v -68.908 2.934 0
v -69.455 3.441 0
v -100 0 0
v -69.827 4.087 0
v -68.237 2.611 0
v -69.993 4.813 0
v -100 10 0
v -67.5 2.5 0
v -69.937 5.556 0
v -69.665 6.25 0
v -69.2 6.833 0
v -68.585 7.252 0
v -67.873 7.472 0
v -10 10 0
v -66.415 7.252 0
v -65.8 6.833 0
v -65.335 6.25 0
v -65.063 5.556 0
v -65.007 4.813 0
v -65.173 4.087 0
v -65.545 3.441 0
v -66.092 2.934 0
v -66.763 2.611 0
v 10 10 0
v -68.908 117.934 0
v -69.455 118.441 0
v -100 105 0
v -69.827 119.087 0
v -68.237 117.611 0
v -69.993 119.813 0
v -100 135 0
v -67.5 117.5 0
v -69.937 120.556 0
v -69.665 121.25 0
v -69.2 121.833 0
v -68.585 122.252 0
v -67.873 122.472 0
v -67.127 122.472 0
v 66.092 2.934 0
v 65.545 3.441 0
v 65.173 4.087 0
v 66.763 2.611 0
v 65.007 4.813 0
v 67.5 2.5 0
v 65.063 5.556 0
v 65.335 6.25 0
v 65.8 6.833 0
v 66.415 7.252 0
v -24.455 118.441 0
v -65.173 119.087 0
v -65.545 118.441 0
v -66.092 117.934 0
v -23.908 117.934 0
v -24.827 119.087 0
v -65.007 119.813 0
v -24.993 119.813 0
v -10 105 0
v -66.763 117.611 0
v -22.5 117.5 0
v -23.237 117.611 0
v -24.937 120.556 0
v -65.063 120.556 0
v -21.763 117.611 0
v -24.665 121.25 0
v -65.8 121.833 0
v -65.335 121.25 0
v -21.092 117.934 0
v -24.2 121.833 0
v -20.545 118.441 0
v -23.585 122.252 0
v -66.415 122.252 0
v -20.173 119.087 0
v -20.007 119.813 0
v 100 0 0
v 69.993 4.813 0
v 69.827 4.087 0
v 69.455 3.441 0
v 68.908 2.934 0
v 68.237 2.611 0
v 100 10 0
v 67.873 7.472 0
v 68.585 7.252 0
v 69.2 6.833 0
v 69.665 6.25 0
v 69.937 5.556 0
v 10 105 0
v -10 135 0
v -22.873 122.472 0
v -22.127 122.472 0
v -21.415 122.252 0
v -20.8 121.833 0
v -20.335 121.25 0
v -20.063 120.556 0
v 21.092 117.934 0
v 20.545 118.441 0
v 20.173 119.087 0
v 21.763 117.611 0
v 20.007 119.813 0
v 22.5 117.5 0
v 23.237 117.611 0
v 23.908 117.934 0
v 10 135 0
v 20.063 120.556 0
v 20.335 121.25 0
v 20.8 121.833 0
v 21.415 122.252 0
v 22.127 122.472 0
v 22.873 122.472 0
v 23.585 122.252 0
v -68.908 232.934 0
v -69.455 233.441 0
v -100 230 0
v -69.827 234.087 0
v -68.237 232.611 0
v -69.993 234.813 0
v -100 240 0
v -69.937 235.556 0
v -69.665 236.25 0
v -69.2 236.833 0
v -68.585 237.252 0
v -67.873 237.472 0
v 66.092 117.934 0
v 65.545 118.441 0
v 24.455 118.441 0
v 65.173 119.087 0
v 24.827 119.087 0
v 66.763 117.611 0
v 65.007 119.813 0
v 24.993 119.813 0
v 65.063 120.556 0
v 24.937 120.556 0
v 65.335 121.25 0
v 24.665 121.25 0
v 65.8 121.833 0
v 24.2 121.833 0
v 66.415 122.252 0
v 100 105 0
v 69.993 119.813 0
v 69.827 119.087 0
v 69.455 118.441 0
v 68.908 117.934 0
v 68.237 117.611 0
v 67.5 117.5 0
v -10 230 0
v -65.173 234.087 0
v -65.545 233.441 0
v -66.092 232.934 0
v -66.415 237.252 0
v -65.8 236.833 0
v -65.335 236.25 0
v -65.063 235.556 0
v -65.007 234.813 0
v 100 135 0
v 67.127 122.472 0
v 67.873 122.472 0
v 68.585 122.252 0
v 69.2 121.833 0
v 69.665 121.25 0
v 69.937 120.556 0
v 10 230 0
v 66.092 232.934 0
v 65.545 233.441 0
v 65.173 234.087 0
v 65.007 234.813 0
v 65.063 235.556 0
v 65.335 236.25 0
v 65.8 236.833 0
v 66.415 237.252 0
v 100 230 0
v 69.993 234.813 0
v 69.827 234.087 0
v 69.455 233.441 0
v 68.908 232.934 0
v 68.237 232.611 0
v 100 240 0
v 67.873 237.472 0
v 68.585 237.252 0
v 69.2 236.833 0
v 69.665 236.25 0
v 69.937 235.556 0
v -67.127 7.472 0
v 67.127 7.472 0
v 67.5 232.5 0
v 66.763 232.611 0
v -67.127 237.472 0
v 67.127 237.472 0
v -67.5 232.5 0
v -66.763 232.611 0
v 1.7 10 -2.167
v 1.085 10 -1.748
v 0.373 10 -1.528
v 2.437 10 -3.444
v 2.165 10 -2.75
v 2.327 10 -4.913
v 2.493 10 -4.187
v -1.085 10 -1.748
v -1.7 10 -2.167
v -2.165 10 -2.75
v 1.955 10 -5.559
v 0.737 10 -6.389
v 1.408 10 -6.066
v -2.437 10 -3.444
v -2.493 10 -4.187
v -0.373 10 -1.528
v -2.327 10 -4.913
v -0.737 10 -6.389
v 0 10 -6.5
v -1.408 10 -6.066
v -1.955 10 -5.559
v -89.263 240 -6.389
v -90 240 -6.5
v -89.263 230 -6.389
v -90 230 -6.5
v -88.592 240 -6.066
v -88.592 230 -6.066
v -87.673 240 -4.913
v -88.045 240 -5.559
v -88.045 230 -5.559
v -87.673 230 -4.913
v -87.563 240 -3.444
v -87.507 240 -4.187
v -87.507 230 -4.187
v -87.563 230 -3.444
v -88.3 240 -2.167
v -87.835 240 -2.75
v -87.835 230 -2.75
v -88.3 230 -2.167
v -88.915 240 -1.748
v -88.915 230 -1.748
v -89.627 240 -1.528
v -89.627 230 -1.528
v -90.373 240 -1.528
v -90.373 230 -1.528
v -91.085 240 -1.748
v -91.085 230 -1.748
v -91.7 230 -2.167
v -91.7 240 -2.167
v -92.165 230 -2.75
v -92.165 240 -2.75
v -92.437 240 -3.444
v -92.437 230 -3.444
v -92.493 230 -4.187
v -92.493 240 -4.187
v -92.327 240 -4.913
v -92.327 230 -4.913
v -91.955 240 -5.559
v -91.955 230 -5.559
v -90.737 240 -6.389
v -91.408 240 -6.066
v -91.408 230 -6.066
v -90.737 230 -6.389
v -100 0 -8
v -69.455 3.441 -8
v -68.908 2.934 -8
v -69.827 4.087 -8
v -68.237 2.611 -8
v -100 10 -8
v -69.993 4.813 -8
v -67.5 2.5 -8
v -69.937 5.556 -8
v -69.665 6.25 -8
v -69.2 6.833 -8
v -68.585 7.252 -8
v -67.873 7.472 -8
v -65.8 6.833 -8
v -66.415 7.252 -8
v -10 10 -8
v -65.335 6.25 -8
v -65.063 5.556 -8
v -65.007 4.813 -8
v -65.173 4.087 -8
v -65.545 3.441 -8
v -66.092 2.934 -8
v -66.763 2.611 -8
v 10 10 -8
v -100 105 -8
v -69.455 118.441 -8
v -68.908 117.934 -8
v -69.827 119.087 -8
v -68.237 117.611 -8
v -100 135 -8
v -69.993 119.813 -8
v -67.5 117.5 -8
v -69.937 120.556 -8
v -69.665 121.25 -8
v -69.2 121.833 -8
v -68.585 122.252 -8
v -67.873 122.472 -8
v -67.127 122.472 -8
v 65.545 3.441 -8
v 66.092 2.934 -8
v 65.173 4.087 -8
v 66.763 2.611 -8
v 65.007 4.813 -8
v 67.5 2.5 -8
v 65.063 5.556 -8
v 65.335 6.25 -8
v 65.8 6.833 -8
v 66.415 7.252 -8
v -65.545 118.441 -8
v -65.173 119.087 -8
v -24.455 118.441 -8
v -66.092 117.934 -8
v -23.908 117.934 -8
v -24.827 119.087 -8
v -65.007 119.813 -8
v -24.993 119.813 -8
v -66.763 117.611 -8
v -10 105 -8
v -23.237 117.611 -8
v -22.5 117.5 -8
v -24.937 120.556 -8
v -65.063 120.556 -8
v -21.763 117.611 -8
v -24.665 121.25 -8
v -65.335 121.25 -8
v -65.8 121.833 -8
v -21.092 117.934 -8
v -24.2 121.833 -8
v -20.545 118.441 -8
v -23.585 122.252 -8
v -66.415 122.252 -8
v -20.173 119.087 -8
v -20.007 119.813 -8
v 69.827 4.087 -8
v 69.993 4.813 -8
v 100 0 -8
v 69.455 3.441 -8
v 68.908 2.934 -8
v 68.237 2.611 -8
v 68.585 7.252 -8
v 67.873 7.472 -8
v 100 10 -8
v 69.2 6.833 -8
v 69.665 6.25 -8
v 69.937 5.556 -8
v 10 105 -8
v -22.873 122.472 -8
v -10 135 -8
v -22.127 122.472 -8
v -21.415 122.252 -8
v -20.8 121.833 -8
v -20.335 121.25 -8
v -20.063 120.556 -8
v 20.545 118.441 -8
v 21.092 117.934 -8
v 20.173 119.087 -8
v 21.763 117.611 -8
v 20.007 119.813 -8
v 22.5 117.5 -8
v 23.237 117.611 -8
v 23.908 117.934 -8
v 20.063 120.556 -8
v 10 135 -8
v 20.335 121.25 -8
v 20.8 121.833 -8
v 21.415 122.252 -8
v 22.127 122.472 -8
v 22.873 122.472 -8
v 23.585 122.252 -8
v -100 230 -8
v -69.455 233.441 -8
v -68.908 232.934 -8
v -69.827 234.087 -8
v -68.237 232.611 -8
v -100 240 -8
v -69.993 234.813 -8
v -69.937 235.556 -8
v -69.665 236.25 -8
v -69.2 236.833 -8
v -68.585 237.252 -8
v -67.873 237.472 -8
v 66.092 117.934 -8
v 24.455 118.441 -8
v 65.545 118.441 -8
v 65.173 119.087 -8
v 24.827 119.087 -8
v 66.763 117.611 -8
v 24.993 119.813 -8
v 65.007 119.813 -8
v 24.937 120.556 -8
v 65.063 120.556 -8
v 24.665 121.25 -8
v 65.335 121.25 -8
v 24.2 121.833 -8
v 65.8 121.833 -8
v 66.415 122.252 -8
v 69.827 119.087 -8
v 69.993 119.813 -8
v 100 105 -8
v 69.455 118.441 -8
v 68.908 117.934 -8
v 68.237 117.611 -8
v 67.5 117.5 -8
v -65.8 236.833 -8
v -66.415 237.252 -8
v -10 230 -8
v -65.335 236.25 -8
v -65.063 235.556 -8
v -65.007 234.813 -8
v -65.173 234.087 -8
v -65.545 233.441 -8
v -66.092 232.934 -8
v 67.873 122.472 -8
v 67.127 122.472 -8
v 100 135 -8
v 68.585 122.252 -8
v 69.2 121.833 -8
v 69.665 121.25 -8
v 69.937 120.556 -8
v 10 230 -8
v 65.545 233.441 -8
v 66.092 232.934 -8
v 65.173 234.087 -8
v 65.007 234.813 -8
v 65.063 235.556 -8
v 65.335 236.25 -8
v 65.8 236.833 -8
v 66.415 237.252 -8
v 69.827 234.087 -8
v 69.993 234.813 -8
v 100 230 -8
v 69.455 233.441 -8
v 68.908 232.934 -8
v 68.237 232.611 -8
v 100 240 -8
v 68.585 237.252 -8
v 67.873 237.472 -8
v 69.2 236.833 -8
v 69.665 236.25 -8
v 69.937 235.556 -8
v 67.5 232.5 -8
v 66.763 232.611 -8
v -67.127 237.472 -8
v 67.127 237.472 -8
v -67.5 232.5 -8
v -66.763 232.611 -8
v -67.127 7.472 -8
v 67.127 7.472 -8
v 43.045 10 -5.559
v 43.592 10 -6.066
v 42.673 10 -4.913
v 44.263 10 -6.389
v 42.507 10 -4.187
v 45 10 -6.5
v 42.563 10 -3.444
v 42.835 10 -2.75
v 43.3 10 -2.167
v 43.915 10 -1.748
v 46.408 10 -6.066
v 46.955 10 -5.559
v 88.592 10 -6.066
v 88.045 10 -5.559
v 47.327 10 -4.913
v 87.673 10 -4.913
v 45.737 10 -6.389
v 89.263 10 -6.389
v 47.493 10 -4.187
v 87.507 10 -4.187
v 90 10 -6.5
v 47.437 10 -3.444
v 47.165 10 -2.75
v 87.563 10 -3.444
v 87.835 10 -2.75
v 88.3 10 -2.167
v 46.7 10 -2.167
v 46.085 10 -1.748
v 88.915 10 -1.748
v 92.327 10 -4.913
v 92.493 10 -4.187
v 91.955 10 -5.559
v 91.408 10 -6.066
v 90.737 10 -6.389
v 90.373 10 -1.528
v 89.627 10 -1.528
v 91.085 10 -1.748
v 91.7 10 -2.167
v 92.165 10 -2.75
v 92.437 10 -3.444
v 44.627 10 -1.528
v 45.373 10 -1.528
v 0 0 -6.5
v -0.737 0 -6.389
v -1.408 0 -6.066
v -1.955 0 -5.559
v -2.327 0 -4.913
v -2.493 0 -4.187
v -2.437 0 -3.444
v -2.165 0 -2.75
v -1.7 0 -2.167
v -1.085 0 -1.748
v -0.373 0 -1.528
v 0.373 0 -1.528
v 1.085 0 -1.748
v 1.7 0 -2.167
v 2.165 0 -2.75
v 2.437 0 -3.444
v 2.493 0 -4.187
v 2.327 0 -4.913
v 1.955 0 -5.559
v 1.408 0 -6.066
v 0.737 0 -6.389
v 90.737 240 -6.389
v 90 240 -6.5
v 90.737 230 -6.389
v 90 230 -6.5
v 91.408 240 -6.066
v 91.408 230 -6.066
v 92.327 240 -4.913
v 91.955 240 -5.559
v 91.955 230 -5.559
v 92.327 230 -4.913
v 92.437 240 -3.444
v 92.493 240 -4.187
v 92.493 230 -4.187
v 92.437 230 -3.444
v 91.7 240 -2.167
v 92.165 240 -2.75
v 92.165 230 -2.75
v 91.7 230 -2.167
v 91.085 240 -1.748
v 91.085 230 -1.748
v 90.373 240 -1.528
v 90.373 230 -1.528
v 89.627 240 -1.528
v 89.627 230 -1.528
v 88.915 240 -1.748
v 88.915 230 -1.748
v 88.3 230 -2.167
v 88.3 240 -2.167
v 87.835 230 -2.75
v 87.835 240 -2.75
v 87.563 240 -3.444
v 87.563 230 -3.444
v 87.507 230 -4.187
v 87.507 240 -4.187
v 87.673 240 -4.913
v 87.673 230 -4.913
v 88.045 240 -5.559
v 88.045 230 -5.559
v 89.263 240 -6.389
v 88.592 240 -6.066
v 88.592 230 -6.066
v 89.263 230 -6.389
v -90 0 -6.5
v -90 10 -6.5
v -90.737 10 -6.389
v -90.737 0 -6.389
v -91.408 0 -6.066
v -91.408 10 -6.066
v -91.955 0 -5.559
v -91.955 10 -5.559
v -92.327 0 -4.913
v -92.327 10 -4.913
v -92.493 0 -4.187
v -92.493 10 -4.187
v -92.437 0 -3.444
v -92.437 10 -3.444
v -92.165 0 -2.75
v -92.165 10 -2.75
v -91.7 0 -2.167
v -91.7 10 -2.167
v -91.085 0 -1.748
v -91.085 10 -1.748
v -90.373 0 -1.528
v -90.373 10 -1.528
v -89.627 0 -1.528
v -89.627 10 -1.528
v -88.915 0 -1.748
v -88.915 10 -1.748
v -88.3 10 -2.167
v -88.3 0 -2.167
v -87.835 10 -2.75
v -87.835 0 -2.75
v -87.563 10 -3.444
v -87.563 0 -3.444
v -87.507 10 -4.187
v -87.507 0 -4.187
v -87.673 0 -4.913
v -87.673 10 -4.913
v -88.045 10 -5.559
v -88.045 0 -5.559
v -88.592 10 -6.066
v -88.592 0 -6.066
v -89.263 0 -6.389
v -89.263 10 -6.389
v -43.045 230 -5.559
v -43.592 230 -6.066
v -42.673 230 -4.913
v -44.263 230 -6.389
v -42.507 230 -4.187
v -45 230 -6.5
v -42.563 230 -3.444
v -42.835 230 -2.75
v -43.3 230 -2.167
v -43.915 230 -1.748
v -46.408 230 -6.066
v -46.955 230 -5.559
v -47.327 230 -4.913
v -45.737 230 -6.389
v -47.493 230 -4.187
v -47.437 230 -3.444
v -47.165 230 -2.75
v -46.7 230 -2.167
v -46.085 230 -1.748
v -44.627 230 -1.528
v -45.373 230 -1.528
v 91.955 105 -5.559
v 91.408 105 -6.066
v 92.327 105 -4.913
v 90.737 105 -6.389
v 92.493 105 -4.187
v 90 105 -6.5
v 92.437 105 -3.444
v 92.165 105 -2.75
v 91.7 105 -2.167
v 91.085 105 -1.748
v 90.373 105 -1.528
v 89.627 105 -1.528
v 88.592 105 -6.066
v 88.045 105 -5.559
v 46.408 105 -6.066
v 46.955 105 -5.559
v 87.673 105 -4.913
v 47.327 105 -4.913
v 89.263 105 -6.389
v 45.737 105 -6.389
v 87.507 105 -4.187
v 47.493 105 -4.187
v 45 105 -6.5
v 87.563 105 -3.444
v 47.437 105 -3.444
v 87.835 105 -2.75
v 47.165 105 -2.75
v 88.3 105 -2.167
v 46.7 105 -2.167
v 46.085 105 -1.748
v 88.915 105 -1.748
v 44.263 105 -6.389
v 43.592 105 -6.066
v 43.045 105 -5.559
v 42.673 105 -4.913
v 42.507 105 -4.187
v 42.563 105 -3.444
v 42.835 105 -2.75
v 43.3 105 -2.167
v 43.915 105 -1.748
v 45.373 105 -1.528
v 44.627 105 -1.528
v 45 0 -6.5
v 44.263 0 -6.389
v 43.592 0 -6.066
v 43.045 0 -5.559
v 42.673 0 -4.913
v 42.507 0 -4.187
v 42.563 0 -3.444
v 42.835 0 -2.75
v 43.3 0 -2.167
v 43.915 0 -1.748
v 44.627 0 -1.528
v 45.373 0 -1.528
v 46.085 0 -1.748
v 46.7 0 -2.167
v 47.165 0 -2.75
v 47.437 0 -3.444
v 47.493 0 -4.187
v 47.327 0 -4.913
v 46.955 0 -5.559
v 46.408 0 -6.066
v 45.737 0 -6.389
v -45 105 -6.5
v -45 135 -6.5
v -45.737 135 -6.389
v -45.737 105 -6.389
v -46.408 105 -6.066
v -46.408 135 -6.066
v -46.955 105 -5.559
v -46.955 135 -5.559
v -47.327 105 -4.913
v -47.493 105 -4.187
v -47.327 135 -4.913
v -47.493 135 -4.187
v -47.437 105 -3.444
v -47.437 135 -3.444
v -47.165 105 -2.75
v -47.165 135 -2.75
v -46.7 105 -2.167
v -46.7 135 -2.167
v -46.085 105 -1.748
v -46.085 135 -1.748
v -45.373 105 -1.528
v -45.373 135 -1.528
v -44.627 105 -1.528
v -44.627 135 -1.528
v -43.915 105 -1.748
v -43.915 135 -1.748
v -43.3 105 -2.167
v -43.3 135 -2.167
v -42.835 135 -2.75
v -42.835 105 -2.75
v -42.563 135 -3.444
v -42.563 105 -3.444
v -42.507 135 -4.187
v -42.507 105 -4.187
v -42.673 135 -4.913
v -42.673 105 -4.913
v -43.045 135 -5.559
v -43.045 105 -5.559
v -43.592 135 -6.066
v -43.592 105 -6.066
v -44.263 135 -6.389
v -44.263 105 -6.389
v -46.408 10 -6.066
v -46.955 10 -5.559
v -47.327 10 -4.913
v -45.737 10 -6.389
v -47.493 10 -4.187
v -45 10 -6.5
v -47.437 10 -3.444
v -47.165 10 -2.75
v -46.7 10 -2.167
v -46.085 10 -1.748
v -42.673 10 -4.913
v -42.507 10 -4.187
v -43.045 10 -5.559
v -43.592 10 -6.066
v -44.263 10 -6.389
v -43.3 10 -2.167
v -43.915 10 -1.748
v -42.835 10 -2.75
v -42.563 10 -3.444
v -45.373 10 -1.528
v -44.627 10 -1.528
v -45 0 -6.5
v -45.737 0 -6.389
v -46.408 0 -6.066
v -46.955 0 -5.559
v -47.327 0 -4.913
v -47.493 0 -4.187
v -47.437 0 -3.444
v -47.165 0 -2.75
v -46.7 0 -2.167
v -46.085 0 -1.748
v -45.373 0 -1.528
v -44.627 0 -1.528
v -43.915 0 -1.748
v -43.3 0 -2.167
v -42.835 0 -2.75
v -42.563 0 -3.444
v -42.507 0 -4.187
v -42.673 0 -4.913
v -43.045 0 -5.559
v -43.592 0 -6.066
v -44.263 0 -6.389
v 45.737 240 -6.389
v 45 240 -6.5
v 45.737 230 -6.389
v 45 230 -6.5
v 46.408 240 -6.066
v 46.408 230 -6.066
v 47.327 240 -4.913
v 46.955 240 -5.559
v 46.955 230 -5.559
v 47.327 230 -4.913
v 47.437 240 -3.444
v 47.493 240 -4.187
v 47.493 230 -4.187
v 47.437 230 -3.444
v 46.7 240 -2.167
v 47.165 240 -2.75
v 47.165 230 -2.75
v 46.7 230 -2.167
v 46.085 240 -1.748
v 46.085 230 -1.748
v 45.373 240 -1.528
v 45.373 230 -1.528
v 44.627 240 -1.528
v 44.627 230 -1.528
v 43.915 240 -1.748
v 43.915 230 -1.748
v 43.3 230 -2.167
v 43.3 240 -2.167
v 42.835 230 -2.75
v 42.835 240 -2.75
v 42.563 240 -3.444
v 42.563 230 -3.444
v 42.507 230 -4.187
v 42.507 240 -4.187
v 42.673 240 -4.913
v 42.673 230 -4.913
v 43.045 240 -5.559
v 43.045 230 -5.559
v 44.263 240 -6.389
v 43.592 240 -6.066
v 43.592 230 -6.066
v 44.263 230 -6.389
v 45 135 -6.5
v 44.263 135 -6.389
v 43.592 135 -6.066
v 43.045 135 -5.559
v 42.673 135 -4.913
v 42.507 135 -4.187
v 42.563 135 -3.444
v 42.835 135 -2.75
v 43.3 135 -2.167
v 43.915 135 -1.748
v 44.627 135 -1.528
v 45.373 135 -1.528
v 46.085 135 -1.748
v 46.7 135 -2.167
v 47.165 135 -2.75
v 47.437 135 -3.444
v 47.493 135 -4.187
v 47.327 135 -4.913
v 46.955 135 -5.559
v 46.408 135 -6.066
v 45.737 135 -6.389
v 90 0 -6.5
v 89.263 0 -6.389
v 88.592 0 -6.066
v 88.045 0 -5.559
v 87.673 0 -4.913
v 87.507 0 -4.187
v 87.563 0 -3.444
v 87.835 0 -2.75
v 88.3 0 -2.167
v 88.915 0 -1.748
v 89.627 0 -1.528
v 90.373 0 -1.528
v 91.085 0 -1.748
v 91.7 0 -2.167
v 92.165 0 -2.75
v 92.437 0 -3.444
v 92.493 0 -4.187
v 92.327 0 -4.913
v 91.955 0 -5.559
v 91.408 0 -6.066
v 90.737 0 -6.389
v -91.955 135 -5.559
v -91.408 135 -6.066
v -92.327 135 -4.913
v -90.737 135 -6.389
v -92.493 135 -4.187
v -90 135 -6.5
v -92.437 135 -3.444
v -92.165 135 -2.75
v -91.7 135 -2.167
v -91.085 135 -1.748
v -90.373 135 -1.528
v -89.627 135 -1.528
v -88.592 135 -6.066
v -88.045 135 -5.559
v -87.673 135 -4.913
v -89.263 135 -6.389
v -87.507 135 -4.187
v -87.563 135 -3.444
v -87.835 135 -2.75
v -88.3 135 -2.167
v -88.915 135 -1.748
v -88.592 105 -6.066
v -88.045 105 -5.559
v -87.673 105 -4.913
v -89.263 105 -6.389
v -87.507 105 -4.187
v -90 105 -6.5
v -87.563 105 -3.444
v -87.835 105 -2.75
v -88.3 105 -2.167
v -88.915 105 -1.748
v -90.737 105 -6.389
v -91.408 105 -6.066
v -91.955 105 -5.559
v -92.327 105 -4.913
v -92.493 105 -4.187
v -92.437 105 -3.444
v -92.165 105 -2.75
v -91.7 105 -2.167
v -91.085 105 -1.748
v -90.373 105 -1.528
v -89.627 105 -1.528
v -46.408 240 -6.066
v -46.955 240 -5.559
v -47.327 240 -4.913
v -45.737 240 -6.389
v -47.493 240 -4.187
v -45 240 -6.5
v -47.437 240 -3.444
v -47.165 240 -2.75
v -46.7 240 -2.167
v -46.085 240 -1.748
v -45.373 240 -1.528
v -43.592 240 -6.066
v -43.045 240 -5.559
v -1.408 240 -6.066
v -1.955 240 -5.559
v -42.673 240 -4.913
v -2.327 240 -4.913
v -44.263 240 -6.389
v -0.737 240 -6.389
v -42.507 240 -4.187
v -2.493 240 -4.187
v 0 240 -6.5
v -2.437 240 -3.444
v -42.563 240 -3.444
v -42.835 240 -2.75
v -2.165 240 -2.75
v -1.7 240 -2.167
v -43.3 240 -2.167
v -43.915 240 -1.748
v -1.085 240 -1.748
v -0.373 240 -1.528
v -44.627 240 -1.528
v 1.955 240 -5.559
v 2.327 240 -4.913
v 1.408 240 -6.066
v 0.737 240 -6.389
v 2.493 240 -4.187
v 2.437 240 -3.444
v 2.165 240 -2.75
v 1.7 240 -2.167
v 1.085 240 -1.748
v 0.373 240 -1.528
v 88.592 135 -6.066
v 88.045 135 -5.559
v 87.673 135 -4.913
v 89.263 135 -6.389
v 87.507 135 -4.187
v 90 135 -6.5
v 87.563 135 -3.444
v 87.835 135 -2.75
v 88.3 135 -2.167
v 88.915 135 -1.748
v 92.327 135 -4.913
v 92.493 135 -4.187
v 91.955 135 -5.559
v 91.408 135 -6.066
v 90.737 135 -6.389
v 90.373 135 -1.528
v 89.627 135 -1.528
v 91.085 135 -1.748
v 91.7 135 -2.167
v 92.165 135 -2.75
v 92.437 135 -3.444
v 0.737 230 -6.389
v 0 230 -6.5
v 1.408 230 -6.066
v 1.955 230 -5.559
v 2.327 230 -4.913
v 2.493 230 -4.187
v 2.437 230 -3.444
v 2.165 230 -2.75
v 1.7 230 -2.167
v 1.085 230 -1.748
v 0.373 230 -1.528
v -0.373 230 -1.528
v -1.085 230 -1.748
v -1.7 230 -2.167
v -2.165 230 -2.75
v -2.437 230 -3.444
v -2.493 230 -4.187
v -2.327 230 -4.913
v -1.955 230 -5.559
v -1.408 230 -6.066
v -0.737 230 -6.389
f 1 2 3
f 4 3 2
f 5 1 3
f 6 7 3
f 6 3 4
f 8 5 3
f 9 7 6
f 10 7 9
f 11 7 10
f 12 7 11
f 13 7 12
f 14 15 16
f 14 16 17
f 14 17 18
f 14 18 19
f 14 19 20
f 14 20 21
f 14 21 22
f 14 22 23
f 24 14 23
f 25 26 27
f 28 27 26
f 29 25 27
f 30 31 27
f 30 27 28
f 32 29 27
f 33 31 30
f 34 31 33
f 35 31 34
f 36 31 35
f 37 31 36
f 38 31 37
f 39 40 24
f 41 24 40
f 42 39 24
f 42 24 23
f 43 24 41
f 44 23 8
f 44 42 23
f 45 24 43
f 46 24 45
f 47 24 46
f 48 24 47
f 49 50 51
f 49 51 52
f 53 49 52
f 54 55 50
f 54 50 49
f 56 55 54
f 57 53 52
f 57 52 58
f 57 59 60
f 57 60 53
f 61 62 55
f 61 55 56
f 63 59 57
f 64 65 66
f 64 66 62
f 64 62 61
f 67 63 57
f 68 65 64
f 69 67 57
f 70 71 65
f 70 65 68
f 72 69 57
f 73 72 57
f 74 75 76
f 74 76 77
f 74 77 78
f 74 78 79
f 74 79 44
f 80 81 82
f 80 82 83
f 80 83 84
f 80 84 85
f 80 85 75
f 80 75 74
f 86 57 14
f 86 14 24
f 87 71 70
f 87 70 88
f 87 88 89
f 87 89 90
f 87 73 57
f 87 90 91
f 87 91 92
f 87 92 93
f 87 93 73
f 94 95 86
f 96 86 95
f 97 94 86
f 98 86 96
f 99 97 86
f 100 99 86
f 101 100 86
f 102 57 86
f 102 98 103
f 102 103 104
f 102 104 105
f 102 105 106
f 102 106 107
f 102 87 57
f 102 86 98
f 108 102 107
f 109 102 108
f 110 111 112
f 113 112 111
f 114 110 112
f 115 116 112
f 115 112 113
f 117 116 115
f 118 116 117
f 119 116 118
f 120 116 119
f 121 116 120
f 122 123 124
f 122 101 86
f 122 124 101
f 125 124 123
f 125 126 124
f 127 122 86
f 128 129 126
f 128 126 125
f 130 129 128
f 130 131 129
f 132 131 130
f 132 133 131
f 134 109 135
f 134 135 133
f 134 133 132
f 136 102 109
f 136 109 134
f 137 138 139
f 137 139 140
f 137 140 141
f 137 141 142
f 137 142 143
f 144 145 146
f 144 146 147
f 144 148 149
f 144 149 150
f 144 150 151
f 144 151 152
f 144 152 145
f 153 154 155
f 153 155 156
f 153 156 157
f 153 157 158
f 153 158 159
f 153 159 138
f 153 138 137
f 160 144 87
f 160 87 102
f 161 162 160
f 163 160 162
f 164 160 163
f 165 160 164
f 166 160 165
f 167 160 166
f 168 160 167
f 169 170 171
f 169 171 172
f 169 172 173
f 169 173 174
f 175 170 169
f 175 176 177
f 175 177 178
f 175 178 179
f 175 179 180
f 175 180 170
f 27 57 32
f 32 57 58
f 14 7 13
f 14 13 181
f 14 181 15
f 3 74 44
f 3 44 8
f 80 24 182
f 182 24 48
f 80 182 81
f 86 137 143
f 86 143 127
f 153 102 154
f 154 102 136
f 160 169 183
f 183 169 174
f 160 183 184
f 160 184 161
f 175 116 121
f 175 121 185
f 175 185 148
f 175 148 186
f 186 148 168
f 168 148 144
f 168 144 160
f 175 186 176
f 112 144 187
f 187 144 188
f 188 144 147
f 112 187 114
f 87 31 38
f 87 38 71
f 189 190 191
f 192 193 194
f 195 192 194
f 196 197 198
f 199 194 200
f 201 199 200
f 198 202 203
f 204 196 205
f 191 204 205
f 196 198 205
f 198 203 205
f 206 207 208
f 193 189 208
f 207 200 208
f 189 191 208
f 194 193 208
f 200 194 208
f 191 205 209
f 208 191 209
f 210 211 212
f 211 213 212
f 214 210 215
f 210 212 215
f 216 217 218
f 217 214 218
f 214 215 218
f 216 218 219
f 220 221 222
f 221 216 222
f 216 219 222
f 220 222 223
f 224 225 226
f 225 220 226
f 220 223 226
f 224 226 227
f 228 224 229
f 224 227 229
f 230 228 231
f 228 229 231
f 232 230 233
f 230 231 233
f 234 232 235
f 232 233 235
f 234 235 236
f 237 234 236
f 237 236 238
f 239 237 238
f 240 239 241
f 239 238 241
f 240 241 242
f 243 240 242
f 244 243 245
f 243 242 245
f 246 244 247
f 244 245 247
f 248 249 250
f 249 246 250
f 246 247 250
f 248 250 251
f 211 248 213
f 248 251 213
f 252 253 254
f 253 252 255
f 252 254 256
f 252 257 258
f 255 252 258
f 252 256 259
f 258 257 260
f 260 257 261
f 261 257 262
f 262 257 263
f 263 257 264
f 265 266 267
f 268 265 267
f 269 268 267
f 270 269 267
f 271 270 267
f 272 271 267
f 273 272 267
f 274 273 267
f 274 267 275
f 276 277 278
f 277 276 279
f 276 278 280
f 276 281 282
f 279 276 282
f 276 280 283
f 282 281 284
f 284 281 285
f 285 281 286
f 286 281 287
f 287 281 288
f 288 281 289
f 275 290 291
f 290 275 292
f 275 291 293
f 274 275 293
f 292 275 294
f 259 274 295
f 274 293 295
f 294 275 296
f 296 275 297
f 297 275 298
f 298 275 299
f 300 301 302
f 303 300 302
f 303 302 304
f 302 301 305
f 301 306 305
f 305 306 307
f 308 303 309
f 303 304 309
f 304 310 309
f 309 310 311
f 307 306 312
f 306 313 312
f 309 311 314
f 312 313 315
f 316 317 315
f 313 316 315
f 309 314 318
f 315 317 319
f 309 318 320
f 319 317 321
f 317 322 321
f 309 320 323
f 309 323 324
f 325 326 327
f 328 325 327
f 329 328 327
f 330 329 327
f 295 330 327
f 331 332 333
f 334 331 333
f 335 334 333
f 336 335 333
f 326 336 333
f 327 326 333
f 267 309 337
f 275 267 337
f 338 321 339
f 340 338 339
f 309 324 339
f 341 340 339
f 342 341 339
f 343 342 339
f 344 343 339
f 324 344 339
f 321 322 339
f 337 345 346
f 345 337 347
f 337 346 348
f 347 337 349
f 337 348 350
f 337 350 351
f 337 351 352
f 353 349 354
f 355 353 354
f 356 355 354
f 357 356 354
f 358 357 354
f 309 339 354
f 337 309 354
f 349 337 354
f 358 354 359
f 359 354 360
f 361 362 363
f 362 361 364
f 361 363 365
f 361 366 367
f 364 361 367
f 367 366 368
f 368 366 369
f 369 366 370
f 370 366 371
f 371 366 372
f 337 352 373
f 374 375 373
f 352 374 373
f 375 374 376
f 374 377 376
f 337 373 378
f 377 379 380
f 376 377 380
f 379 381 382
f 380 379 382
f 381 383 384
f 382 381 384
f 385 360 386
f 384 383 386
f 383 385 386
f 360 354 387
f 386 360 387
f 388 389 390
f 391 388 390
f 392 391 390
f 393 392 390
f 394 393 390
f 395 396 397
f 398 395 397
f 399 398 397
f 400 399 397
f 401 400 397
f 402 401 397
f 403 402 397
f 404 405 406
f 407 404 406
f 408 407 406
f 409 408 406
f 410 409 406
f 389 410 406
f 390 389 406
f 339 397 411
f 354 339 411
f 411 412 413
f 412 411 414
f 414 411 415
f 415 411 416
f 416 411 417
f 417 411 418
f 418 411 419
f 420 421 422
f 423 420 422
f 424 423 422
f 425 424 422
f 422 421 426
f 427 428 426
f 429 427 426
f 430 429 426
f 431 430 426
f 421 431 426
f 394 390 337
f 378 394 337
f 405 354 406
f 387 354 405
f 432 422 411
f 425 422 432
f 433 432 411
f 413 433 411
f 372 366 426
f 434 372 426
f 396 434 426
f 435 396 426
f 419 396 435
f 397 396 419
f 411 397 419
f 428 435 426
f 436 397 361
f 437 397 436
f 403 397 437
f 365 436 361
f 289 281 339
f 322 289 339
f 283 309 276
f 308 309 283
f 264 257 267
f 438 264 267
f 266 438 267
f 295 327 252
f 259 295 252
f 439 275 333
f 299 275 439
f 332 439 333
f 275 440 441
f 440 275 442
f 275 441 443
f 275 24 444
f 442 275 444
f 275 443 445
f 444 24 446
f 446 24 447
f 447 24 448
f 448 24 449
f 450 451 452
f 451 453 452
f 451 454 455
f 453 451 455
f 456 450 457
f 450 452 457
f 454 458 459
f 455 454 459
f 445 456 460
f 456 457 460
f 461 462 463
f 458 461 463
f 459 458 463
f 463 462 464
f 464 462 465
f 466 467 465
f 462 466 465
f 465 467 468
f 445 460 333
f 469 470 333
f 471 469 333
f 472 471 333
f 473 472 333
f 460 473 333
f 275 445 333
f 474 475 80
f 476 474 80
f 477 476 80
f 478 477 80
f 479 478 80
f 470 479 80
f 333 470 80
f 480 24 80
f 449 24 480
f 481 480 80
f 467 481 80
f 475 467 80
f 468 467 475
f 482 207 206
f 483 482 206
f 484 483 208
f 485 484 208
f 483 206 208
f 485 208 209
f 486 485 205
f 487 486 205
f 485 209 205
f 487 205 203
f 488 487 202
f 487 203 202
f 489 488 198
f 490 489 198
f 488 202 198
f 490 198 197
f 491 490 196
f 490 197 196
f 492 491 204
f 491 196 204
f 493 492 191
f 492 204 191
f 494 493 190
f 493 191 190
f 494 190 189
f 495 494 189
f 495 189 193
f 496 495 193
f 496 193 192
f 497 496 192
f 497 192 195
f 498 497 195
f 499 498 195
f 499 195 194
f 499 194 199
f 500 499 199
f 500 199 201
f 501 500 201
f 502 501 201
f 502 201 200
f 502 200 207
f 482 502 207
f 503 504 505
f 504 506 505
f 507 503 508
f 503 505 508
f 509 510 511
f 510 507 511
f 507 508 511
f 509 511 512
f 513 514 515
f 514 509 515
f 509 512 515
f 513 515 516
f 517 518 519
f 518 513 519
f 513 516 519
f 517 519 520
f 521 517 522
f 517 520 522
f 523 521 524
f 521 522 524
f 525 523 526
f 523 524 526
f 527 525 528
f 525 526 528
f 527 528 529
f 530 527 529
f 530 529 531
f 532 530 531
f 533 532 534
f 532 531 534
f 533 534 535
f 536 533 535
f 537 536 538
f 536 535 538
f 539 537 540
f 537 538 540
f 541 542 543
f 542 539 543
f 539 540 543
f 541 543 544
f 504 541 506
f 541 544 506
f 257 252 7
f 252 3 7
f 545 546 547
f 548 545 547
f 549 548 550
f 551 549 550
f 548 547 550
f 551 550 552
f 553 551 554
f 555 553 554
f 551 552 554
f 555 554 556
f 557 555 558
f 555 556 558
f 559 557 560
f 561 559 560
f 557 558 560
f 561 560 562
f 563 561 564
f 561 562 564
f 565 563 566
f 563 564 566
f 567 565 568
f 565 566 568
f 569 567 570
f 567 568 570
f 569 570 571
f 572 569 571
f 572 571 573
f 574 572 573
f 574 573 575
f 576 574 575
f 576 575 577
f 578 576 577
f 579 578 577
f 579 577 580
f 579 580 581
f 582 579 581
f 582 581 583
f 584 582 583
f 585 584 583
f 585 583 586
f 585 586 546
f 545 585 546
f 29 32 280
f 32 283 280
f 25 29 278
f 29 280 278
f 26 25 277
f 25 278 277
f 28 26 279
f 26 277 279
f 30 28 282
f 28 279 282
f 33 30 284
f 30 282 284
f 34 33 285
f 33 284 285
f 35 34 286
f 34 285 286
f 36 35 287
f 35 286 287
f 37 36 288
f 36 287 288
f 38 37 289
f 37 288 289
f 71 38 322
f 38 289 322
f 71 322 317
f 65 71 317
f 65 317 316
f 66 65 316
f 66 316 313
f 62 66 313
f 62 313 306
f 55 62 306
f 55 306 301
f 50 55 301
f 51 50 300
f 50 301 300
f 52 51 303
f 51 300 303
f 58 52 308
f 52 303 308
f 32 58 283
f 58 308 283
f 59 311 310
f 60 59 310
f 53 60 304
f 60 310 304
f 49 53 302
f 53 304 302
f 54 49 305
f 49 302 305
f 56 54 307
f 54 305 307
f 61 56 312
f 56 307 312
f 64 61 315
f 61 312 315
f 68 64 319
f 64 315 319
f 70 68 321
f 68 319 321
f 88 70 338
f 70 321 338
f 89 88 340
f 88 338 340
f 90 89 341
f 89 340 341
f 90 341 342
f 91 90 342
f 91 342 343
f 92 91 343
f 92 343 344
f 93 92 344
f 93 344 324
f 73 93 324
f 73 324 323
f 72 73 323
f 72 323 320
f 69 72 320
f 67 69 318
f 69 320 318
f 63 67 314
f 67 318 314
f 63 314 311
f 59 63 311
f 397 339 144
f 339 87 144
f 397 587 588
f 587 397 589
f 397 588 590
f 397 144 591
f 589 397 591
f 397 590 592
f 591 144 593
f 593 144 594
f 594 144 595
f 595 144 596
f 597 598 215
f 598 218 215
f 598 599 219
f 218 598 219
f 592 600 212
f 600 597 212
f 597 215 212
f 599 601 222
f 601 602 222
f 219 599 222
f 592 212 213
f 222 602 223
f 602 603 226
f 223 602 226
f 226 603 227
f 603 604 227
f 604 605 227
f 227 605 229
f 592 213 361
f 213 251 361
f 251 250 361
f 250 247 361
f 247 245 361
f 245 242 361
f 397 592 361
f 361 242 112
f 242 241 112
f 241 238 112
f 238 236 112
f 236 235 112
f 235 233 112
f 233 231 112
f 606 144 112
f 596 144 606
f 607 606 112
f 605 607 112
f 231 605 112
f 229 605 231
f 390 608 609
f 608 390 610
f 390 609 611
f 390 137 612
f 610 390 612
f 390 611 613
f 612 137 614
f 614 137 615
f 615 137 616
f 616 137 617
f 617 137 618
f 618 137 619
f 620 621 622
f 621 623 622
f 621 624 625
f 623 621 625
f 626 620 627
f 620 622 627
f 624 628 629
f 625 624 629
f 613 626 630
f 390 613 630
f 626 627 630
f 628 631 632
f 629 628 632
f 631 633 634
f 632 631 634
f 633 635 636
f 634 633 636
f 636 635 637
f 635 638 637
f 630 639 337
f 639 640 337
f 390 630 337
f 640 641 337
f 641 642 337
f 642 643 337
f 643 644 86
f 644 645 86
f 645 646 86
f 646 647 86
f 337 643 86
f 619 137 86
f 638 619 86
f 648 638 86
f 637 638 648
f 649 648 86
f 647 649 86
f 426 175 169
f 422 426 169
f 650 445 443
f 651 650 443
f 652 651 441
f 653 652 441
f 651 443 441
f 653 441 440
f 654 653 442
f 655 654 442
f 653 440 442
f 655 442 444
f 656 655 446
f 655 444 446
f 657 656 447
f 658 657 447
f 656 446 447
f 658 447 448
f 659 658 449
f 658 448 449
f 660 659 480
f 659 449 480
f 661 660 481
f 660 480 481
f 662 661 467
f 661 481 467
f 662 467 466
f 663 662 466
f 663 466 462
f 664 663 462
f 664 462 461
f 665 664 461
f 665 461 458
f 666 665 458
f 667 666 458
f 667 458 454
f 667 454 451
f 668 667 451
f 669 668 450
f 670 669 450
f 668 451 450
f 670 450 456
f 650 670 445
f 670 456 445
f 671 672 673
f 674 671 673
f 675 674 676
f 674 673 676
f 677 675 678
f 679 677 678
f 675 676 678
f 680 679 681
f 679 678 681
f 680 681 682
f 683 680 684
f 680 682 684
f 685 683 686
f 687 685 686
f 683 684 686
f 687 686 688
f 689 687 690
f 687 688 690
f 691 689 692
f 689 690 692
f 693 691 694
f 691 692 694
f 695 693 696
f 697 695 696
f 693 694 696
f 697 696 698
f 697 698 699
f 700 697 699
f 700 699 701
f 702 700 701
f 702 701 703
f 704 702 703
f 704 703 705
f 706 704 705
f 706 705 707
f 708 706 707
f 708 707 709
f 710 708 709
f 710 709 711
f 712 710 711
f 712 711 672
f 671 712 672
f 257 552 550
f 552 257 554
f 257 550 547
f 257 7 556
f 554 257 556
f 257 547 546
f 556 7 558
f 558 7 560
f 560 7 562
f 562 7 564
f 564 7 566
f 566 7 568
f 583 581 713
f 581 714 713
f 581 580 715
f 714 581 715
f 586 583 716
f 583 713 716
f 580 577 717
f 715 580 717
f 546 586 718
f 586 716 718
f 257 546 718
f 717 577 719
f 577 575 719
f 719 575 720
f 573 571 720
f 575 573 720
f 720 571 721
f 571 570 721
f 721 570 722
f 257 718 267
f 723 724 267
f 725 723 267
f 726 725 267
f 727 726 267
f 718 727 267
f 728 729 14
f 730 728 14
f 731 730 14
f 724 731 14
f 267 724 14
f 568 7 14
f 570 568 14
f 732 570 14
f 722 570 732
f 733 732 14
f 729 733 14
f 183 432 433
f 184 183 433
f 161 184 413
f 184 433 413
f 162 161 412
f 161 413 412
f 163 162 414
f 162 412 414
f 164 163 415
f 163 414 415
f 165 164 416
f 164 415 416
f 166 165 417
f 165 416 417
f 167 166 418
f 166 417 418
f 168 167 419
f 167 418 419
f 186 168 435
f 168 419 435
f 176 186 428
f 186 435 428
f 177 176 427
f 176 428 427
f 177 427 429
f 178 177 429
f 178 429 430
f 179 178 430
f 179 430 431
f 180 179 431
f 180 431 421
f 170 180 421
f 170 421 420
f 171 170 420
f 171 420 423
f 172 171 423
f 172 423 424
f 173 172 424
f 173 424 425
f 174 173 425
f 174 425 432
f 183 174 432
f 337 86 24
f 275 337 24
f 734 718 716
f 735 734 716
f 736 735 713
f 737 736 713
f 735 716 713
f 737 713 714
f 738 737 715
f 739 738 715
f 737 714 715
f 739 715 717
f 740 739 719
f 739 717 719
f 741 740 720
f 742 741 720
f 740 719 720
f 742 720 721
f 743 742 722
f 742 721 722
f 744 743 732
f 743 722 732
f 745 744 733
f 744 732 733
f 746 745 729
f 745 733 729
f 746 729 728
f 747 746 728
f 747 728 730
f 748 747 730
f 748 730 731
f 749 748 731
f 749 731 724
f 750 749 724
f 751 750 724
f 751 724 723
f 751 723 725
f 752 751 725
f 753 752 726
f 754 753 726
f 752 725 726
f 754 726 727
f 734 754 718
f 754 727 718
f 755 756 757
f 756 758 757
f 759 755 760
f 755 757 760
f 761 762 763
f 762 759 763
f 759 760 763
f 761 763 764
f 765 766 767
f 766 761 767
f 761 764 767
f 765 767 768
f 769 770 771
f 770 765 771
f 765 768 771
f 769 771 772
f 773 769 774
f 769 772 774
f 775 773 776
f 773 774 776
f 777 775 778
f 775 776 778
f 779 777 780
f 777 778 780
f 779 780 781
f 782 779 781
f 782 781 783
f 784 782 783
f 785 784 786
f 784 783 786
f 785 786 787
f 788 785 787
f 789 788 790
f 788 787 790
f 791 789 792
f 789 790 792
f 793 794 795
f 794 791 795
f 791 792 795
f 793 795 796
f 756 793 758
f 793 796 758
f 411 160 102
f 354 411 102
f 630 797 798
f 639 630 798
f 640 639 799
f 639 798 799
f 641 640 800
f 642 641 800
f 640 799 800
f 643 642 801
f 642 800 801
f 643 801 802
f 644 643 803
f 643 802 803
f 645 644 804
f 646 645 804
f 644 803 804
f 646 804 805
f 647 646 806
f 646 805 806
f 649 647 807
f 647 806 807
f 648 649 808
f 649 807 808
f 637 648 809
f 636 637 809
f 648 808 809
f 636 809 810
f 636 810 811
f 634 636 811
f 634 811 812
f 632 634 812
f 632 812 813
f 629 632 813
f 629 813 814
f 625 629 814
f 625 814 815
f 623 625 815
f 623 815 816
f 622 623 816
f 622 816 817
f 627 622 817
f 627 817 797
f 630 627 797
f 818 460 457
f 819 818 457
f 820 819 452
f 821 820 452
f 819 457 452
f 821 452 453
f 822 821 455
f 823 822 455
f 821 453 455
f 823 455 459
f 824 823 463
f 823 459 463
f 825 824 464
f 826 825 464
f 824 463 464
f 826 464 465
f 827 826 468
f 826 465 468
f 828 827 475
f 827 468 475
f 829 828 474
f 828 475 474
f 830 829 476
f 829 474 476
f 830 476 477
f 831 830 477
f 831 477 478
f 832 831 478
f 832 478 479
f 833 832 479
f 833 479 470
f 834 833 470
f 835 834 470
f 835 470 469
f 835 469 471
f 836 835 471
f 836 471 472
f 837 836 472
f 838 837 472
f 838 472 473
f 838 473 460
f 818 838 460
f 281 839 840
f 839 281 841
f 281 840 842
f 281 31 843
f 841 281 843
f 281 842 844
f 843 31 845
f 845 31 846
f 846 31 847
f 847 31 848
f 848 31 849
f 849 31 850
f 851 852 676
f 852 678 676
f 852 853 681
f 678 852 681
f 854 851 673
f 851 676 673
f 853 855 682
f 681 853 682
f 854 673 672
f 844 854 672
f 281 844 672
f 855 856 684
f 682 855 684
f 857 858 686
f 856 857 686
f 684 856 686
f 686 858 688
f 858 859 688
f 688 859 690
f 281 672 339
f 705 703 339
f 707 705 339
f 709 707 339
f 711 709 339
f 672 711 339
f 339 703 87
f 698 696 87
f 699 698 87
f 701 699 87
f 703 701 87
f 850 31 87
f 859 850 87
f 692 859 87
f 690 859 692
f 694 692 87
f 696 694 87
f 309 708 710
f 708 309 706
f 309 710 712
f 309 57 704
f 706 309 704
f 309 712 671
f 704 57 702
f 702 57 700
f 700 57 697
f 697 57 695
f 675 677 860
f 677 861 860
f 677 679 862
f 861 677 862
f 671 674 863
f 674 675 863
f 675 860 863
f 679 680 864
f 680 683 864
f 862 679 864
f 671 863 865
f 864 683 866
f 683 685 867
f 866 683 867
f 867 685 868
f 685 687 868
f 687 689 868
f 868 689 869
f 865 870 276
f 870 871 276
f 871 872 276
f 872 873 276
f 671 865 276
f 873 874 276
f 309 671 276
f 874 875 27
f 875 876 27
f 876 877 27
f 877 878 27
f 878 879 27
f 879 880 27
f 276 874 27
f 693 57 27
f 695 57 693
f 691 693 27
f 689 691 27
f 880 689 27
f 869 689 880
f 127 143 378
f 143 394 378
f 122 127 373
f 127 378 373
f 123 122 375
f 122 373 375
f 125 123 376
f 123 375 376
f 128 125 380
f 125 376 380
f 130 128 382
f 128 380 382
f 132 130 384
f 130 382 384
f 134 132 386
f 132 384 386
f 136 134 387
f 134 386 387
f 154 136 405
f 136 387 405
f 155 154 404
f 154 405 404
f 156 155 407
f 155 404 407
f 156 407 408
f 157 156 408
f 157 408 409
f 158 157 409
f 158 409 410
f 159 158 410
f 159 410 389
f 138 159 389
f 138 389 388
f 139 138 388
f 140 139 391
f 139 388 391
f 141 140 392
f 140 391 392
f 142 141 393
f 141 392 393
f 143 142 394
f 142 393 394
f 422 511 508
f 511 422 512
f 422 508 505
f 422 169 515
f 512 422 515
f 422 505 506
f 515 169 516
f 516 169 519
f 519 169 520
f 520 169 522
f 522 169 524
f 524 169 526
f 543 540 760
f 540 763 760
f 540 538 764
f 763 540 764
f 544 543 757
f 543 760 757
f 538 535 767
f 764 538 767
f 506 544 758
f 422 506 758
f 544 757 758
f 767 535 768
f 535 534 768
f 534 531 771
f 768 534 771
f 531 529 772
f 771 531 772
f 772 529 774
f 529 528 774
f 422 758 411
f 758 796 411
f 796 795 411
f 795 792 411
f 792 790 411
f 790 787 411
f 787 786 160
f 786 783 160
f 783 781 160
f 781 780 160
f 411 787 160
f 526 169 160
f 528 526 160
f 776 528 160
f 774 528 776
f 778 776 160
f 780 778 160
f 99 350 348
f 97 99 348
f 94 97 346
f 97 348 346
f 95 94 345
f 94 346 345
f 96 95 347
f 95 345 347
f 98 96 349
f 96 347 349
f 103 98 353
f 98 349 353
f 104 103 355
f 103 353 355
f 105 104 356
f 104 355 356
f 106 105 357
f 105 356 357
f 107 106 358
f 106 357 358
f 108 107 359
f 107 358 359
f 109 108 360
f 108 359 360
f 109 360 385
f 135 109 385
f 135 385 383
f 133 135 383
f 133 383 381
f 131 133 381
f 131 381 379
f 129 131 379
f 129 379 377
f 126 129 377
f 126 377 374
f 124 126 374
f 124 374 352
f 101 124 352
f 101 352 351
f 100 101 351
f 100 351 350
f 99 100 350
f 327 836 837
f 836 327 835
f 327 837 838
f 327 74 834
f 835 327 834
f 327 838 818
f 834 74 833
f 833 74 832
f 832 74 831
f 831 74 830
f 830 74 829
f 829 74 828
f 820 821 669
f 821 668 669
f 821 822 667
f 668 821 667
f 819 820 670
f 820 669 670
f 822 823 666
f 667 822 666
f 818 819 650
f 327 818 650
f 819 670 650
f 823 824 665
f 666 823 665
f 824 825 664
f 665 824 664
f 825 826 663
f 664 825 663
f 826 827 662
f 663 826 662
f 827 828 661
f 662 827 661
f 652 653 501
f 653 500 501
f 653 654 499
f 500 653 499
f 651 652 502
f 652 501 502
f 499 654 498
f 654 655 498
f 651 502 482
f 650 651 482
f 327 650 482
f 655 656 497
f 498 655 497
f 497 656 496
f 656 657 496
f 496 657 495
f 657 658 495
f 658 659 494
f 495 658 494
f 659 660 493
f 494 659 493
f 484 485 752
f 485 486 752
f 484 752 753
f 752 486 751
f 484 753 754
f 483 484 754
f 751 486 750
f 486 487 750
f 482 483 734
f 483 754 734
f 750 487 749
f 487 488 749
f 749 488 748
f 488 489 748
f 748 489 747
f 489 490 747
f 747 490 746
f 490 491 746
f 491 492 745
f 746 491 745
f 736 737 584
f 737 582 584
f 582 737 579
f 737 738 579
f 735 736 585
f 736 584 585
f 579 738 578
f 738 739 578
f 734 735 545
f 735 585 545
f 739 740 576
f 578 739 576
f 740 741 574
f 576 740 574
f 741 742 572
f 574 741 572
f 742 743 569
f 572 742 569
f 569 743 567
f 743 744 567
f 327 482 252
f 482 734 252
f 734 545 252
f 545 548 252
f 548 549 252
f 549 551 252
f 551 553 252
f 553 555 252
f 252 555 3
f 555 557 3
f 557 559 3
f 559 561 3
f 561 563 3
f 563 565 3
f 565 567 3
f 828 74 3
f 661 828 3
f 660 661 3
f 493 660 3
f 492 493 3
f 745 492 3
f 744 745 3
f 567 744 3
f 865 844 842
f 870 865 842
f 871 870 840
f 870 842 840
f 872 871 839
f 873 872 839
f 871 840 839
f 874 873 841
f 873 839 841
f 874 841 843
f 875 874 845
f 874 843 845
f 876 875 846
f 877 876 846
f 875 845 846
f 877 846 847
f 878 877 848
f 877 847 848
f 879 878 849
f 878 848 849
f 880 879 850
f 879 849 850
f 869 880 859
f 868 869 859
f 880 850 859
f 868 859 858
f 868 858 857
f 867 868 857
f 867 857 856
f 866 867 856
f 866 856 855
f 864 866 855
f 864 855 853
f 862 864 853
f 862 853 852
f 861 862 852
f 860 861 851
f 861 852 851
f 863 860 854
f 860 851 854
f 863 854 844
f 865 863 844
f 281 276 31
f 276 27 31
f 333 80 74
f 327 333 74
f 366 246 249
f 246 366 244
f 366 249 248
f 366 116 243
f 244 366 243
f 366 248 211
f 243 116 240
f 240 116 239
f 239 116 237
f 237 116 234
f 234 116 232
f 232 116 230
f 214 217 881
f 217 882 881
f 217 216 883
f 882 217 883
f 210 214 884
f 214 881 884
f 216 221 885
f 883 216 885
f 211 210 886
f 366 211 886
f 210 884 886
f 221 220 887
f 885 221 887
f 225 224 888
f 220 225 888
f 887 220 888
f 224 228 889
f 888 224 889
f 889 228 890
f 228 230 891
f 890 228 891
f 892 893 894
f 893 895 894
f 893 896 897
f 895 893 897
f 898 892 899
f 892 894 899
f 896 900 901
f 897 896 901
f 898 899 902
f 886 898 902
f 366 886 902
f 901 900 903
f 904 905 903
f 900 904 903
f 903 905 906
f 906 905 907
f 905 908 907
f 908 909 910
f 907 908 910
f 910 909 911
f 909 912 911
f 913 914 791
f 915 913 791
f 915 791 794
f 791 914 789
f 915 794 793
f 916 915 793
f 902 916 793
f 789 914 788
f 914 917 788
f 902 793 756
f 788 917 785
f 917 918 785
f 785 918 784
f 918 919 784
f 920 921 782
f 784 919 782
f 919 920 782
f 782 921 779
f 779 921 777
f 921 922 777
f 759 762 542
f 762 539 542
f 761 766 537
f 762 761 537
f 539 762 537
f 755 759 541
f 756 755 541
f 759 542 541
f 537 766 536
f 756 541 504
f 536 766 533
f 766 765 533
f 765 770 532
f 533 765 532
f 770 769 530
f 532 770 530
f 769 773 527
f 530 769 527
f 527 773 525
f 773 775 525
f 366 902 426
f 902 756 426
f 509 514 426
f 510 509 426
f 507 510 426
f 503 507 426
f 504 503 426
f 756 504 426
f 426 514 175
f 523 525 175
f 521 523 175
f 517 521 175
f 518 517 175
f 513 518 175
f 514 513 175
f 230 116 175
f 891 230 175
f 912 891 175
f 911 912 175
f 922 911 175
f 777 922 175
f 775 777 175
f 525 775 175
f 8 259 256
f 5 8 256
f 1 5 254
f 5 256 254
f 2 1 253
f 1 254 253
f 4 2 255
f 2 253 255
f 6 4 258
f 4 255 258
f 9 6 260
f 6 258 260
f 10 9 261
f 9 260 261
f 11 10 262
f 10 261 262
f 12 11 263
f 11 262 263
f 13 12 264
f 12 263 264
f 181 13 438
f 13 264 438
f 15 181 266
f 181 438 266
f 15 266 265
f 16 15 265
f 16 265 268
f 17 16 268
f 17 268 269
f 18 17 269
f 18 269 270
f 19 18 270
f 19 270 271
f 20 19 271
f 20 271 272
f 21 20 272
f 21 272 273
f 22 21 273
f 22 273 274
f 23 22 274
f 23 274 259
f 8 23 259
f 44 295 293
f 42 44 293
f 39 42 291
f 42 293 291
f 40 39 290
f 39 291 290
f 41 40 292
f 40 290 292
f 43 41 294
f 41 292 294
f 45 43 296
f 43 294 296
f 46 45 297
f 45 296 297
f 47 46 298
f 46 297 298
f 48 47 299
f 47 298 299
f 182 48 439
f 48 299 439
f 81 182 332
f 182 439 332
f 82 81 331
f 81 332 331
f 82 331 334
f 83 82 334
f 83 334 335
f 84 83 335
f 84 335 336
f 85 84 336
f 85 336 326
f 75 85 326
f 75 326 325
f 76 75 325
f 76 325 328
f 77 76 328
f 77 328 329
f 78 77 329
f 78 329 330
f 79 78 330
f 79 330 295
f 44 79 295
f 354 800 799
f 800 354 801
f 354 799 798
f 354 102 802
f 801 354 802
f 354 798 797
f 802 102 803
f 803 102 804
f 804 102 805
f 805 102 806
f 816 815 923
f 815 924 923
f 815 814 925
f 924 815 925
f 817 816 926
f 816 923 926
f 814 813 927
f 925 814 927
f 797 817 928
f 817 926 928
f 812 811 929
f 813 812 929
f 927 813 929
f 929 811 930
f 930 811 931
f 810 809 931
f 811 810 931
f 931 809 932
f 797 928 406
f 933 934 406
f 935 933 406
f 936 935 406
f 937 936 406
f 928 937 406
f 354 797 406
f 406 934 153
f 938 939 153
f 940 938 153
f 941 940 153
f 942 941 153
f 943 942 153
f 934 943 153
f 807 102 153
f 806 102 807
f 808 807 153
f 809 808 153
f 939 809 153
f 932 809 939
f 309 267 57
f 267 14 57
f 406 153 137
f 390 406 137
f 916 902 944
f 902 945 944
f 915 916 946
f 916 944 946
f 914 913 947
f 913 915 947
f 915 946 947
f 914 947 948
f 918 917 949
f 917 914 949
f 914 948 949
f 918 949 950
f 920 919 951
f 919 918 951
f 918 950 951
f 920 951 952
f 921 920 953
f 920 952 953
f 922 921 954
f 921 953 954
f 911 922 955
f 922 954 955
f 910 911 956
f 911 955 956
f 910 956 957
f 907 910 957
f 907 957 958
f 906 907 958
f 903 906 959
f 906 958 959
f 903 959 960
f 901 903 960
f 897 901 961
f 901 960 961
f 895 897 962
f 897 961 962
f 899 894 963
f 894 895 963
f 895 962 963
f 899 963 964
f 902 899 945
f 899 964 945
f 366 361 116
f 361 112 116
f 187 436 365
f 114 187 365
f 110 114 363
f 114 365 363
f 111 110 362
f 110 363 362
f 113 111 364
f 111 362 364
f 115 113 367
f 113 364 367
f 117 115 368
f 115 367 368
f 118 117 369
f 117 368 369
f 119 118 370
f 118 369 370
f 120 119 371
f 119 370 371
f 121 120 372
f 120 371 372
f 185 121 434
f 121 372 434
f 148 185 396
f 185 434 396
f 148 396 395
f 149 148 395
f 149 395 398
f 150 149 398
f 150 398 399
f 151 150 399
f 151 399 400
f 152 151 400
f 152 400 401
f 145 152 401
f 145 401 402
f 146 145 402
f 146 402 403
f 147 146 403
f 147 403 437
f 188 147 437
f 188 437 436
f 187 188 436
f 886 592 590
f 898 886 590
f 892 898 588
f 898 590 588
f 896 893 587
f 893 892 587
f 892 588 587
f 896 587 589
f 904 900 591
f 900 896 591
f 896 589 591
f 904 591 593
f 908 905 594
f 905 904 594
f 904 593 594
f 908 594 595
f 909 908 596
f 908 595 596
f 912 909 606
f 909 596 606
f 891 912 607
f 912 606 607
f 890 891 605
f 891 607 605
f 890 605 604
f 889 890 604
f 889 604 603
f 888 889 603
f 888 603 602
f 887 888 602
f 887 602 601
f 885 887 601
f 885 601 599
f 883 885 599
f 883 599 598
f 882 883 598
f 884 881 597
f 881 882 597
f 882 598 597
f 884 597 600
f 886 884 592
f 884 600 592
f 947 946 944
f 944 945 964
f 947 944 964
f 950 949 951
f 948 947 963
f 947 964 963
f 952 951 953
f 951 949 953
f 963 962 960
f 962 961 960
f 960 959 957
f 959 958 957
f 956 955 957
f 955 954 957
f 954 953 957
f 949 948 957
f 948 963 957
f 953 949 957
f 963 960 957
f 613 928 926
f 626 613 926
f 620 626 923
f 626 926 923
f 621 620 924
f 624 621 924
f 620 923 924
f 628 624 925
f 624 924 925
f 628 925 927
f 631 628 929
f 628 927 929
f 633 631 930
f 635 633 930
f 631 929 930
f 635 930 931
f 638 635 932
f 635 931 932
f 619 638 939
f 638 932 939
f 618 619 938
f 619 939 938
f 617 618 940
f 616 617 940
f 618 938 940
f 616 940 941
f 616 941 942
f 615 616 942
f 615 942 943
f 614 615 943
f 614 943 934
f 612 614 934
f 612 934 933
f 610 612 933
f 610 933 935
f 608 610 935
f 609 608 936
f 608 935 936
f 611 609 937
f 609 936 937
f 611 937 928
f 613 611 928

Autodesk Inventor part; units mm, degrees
ref_plane "YZ Plane" through (0, 0, 0) normal (1, 0, 0) x (0, 1, 0)
ref_plane "XY Plane" through (0, 0, 0) normal (0, 0, 1) x (1, 0, 0)
sketch "Sketch1" plane through (0, 0, 0) normal (0, 0, 1) x (1, 0, 0)
  line L0 (-10, 135) -> (-10, 230)
  line L1 (-10, 230) -> (-100, 230)
  line L2 (-100, 230) -> (-100, 240)
  line L3 (-100, 240) -> (100, 240)
  line L4 (100, 240) -> (100, 230)
  line L5 (100, 230) -> (10, 230)
  line L6 (10, 230) -> (10, 135)
  line L7 (10, 135) -> (100, 135)
  line L8 (100, 135) -> (100, 105)
  line L9 (100, 105) -> (10, 105)
  line L10 (10, 105) -> (10, 10)
  line L11 (10, 10) -> (100, 10)
  line L12 (100, 10) -> (100, 0)
  line L13 (100, 0) -> (-100, 0)
  line L14 (-100, 0) -> (-100, 10)
  line L15 (-100, 10) -> (-10, 10)
  line L16 (-10, 10) -> (-10, 105)
  line L17 (-10, 105) -> (-100, 105)
  line L18 (-100, 105) -> (-100, 135)
  line L19 (-100, 135) -> (-10, 135)
  line L20 (0, 0) -> (0, 240) construction
  dimension "d0" = 10
  dimension "d1" = 200
  dimension "d2" = 20
  dimension "d3" = 30
  dimension "d4" = 10
  dimension "d5" = 95
  dimension "d6" = 95
extrude "Extrusion1" add sketch "Sketch1" against normal blind 8
sketch "Sketch2" plane through (0, 0, 0) normal (0, 0, 1) x (1, 0, 0)
  line L0 (-10, 135) -> (-100, 135) projected
  line L1 (-100, 0) -> (100, 0) projected
  line L2 (-100, 240) -> (-100, 230) projected
  line L3 (-100, 10) -> (-100, 0) projected
  point P0 (0, 0)
  point P1 (-67.5, 120)
  point P2 (-22.5, 120)
  point P3 (22.5, 120)
  point P4 (67.5, 120)
  point P5 (0, 0)
  point P6 (-67.5, 235)
  point P7 (67.5, 235)
  point P8 (67.5, 5)
  point P9 (-67.5, 5)
  point P10 (-100, 235)
  point P11 (-100, 5)
  point P12 (0, 0)
  dimension "d9" = 15
  dimension "d10" = 67.5
  dimension "d11" = 45
  dimension "d12" = 45
  dimension "d13" = 45
  dimension "d14" = 67.5
  dimension "d15" = 135
hole "Hole1" at (-67.5, 120, 0) at (-22.5, 120, 0) at (22.5, 120, 0) at (67.5, 120, 0) at (-67.5, 235, 0) at (67.5, 235, 0) at (67.5, 5, 0) at (-67.5, 5, 0) direction (0, 0, -1) diameter 5 depth 8
sketch "Sketch3" plane through (-100, 0, 0) normal (0, -1, 0) x (1, 0, 0)
  line L0 (0, 0) -> (200, 0) projected
  line L1 (200, -8) -> (0, -8) projected
  point P0 (100, 0)
  point P1 (10, -4)
  point P2 (55, -4)
  point P3 (145, -4)
  point P4 (190, -4)
  point P5 (100, 0)
  point P6 (100, -4)
  point P7 (100, 0)
  dimension "d23" = 4
  dimension "d24" = 45
  dimension "d25" = 90
  dimension "d26" = 90
  dimension "d27" = 45
hole "Hole2" at (-90, 0, -4) at (-45, 0, -4) at (45, 0, -4) at (90, 0, -4) at (0, 0, -4) direction (0, 1, 0) diameter 5 depth 10
ref_plane "Work Plane1" through (0, 120, 0) normal (0, 1, 0) x (-1, 0, 0)
mirror "Mirror1" about plane through (0, 120, 0) normal (0, 1, 0) of "Hole2"
sketch "Sketch4" plane through (-100, 105, 0) normal (0, -1, 0) x (1, 0, 0)
  circle A0 centre (100, -4) radius 2.5 projected
  line L0 (0, -8) -> (90, -8) projected
  point P0 (100, 0)
  point P1 (10, -4)
  point P2 (55, -4)
  point P3 (145, -4)
  point P4 (190, -4)
  dimension "d36" = 4
  dimension "d37" = 180
  dimension "d38" = 90
  dimension "d39" = 45
  dimension "d48" = 45
hole "Hole3" at (-90, 105, -4) at (-45, 105, -4) at (45, 105, -4) at (90, 105, -4) direction (0, 1, 0) diameter 5 depth 30
equation "\"d6\" = d5"
equation "\"d12\" = d11"
equation "\"d13\" = d11"
equation "\"d14\" = d10"
equation "\"d26\" = d25"
equation "\"d27\" = d24"
equation "\"d38\" = 0.5 * d37"
equation "\"d39\" = 0.5 * d38"
properties part number "02" material "Aluminum 6061"
